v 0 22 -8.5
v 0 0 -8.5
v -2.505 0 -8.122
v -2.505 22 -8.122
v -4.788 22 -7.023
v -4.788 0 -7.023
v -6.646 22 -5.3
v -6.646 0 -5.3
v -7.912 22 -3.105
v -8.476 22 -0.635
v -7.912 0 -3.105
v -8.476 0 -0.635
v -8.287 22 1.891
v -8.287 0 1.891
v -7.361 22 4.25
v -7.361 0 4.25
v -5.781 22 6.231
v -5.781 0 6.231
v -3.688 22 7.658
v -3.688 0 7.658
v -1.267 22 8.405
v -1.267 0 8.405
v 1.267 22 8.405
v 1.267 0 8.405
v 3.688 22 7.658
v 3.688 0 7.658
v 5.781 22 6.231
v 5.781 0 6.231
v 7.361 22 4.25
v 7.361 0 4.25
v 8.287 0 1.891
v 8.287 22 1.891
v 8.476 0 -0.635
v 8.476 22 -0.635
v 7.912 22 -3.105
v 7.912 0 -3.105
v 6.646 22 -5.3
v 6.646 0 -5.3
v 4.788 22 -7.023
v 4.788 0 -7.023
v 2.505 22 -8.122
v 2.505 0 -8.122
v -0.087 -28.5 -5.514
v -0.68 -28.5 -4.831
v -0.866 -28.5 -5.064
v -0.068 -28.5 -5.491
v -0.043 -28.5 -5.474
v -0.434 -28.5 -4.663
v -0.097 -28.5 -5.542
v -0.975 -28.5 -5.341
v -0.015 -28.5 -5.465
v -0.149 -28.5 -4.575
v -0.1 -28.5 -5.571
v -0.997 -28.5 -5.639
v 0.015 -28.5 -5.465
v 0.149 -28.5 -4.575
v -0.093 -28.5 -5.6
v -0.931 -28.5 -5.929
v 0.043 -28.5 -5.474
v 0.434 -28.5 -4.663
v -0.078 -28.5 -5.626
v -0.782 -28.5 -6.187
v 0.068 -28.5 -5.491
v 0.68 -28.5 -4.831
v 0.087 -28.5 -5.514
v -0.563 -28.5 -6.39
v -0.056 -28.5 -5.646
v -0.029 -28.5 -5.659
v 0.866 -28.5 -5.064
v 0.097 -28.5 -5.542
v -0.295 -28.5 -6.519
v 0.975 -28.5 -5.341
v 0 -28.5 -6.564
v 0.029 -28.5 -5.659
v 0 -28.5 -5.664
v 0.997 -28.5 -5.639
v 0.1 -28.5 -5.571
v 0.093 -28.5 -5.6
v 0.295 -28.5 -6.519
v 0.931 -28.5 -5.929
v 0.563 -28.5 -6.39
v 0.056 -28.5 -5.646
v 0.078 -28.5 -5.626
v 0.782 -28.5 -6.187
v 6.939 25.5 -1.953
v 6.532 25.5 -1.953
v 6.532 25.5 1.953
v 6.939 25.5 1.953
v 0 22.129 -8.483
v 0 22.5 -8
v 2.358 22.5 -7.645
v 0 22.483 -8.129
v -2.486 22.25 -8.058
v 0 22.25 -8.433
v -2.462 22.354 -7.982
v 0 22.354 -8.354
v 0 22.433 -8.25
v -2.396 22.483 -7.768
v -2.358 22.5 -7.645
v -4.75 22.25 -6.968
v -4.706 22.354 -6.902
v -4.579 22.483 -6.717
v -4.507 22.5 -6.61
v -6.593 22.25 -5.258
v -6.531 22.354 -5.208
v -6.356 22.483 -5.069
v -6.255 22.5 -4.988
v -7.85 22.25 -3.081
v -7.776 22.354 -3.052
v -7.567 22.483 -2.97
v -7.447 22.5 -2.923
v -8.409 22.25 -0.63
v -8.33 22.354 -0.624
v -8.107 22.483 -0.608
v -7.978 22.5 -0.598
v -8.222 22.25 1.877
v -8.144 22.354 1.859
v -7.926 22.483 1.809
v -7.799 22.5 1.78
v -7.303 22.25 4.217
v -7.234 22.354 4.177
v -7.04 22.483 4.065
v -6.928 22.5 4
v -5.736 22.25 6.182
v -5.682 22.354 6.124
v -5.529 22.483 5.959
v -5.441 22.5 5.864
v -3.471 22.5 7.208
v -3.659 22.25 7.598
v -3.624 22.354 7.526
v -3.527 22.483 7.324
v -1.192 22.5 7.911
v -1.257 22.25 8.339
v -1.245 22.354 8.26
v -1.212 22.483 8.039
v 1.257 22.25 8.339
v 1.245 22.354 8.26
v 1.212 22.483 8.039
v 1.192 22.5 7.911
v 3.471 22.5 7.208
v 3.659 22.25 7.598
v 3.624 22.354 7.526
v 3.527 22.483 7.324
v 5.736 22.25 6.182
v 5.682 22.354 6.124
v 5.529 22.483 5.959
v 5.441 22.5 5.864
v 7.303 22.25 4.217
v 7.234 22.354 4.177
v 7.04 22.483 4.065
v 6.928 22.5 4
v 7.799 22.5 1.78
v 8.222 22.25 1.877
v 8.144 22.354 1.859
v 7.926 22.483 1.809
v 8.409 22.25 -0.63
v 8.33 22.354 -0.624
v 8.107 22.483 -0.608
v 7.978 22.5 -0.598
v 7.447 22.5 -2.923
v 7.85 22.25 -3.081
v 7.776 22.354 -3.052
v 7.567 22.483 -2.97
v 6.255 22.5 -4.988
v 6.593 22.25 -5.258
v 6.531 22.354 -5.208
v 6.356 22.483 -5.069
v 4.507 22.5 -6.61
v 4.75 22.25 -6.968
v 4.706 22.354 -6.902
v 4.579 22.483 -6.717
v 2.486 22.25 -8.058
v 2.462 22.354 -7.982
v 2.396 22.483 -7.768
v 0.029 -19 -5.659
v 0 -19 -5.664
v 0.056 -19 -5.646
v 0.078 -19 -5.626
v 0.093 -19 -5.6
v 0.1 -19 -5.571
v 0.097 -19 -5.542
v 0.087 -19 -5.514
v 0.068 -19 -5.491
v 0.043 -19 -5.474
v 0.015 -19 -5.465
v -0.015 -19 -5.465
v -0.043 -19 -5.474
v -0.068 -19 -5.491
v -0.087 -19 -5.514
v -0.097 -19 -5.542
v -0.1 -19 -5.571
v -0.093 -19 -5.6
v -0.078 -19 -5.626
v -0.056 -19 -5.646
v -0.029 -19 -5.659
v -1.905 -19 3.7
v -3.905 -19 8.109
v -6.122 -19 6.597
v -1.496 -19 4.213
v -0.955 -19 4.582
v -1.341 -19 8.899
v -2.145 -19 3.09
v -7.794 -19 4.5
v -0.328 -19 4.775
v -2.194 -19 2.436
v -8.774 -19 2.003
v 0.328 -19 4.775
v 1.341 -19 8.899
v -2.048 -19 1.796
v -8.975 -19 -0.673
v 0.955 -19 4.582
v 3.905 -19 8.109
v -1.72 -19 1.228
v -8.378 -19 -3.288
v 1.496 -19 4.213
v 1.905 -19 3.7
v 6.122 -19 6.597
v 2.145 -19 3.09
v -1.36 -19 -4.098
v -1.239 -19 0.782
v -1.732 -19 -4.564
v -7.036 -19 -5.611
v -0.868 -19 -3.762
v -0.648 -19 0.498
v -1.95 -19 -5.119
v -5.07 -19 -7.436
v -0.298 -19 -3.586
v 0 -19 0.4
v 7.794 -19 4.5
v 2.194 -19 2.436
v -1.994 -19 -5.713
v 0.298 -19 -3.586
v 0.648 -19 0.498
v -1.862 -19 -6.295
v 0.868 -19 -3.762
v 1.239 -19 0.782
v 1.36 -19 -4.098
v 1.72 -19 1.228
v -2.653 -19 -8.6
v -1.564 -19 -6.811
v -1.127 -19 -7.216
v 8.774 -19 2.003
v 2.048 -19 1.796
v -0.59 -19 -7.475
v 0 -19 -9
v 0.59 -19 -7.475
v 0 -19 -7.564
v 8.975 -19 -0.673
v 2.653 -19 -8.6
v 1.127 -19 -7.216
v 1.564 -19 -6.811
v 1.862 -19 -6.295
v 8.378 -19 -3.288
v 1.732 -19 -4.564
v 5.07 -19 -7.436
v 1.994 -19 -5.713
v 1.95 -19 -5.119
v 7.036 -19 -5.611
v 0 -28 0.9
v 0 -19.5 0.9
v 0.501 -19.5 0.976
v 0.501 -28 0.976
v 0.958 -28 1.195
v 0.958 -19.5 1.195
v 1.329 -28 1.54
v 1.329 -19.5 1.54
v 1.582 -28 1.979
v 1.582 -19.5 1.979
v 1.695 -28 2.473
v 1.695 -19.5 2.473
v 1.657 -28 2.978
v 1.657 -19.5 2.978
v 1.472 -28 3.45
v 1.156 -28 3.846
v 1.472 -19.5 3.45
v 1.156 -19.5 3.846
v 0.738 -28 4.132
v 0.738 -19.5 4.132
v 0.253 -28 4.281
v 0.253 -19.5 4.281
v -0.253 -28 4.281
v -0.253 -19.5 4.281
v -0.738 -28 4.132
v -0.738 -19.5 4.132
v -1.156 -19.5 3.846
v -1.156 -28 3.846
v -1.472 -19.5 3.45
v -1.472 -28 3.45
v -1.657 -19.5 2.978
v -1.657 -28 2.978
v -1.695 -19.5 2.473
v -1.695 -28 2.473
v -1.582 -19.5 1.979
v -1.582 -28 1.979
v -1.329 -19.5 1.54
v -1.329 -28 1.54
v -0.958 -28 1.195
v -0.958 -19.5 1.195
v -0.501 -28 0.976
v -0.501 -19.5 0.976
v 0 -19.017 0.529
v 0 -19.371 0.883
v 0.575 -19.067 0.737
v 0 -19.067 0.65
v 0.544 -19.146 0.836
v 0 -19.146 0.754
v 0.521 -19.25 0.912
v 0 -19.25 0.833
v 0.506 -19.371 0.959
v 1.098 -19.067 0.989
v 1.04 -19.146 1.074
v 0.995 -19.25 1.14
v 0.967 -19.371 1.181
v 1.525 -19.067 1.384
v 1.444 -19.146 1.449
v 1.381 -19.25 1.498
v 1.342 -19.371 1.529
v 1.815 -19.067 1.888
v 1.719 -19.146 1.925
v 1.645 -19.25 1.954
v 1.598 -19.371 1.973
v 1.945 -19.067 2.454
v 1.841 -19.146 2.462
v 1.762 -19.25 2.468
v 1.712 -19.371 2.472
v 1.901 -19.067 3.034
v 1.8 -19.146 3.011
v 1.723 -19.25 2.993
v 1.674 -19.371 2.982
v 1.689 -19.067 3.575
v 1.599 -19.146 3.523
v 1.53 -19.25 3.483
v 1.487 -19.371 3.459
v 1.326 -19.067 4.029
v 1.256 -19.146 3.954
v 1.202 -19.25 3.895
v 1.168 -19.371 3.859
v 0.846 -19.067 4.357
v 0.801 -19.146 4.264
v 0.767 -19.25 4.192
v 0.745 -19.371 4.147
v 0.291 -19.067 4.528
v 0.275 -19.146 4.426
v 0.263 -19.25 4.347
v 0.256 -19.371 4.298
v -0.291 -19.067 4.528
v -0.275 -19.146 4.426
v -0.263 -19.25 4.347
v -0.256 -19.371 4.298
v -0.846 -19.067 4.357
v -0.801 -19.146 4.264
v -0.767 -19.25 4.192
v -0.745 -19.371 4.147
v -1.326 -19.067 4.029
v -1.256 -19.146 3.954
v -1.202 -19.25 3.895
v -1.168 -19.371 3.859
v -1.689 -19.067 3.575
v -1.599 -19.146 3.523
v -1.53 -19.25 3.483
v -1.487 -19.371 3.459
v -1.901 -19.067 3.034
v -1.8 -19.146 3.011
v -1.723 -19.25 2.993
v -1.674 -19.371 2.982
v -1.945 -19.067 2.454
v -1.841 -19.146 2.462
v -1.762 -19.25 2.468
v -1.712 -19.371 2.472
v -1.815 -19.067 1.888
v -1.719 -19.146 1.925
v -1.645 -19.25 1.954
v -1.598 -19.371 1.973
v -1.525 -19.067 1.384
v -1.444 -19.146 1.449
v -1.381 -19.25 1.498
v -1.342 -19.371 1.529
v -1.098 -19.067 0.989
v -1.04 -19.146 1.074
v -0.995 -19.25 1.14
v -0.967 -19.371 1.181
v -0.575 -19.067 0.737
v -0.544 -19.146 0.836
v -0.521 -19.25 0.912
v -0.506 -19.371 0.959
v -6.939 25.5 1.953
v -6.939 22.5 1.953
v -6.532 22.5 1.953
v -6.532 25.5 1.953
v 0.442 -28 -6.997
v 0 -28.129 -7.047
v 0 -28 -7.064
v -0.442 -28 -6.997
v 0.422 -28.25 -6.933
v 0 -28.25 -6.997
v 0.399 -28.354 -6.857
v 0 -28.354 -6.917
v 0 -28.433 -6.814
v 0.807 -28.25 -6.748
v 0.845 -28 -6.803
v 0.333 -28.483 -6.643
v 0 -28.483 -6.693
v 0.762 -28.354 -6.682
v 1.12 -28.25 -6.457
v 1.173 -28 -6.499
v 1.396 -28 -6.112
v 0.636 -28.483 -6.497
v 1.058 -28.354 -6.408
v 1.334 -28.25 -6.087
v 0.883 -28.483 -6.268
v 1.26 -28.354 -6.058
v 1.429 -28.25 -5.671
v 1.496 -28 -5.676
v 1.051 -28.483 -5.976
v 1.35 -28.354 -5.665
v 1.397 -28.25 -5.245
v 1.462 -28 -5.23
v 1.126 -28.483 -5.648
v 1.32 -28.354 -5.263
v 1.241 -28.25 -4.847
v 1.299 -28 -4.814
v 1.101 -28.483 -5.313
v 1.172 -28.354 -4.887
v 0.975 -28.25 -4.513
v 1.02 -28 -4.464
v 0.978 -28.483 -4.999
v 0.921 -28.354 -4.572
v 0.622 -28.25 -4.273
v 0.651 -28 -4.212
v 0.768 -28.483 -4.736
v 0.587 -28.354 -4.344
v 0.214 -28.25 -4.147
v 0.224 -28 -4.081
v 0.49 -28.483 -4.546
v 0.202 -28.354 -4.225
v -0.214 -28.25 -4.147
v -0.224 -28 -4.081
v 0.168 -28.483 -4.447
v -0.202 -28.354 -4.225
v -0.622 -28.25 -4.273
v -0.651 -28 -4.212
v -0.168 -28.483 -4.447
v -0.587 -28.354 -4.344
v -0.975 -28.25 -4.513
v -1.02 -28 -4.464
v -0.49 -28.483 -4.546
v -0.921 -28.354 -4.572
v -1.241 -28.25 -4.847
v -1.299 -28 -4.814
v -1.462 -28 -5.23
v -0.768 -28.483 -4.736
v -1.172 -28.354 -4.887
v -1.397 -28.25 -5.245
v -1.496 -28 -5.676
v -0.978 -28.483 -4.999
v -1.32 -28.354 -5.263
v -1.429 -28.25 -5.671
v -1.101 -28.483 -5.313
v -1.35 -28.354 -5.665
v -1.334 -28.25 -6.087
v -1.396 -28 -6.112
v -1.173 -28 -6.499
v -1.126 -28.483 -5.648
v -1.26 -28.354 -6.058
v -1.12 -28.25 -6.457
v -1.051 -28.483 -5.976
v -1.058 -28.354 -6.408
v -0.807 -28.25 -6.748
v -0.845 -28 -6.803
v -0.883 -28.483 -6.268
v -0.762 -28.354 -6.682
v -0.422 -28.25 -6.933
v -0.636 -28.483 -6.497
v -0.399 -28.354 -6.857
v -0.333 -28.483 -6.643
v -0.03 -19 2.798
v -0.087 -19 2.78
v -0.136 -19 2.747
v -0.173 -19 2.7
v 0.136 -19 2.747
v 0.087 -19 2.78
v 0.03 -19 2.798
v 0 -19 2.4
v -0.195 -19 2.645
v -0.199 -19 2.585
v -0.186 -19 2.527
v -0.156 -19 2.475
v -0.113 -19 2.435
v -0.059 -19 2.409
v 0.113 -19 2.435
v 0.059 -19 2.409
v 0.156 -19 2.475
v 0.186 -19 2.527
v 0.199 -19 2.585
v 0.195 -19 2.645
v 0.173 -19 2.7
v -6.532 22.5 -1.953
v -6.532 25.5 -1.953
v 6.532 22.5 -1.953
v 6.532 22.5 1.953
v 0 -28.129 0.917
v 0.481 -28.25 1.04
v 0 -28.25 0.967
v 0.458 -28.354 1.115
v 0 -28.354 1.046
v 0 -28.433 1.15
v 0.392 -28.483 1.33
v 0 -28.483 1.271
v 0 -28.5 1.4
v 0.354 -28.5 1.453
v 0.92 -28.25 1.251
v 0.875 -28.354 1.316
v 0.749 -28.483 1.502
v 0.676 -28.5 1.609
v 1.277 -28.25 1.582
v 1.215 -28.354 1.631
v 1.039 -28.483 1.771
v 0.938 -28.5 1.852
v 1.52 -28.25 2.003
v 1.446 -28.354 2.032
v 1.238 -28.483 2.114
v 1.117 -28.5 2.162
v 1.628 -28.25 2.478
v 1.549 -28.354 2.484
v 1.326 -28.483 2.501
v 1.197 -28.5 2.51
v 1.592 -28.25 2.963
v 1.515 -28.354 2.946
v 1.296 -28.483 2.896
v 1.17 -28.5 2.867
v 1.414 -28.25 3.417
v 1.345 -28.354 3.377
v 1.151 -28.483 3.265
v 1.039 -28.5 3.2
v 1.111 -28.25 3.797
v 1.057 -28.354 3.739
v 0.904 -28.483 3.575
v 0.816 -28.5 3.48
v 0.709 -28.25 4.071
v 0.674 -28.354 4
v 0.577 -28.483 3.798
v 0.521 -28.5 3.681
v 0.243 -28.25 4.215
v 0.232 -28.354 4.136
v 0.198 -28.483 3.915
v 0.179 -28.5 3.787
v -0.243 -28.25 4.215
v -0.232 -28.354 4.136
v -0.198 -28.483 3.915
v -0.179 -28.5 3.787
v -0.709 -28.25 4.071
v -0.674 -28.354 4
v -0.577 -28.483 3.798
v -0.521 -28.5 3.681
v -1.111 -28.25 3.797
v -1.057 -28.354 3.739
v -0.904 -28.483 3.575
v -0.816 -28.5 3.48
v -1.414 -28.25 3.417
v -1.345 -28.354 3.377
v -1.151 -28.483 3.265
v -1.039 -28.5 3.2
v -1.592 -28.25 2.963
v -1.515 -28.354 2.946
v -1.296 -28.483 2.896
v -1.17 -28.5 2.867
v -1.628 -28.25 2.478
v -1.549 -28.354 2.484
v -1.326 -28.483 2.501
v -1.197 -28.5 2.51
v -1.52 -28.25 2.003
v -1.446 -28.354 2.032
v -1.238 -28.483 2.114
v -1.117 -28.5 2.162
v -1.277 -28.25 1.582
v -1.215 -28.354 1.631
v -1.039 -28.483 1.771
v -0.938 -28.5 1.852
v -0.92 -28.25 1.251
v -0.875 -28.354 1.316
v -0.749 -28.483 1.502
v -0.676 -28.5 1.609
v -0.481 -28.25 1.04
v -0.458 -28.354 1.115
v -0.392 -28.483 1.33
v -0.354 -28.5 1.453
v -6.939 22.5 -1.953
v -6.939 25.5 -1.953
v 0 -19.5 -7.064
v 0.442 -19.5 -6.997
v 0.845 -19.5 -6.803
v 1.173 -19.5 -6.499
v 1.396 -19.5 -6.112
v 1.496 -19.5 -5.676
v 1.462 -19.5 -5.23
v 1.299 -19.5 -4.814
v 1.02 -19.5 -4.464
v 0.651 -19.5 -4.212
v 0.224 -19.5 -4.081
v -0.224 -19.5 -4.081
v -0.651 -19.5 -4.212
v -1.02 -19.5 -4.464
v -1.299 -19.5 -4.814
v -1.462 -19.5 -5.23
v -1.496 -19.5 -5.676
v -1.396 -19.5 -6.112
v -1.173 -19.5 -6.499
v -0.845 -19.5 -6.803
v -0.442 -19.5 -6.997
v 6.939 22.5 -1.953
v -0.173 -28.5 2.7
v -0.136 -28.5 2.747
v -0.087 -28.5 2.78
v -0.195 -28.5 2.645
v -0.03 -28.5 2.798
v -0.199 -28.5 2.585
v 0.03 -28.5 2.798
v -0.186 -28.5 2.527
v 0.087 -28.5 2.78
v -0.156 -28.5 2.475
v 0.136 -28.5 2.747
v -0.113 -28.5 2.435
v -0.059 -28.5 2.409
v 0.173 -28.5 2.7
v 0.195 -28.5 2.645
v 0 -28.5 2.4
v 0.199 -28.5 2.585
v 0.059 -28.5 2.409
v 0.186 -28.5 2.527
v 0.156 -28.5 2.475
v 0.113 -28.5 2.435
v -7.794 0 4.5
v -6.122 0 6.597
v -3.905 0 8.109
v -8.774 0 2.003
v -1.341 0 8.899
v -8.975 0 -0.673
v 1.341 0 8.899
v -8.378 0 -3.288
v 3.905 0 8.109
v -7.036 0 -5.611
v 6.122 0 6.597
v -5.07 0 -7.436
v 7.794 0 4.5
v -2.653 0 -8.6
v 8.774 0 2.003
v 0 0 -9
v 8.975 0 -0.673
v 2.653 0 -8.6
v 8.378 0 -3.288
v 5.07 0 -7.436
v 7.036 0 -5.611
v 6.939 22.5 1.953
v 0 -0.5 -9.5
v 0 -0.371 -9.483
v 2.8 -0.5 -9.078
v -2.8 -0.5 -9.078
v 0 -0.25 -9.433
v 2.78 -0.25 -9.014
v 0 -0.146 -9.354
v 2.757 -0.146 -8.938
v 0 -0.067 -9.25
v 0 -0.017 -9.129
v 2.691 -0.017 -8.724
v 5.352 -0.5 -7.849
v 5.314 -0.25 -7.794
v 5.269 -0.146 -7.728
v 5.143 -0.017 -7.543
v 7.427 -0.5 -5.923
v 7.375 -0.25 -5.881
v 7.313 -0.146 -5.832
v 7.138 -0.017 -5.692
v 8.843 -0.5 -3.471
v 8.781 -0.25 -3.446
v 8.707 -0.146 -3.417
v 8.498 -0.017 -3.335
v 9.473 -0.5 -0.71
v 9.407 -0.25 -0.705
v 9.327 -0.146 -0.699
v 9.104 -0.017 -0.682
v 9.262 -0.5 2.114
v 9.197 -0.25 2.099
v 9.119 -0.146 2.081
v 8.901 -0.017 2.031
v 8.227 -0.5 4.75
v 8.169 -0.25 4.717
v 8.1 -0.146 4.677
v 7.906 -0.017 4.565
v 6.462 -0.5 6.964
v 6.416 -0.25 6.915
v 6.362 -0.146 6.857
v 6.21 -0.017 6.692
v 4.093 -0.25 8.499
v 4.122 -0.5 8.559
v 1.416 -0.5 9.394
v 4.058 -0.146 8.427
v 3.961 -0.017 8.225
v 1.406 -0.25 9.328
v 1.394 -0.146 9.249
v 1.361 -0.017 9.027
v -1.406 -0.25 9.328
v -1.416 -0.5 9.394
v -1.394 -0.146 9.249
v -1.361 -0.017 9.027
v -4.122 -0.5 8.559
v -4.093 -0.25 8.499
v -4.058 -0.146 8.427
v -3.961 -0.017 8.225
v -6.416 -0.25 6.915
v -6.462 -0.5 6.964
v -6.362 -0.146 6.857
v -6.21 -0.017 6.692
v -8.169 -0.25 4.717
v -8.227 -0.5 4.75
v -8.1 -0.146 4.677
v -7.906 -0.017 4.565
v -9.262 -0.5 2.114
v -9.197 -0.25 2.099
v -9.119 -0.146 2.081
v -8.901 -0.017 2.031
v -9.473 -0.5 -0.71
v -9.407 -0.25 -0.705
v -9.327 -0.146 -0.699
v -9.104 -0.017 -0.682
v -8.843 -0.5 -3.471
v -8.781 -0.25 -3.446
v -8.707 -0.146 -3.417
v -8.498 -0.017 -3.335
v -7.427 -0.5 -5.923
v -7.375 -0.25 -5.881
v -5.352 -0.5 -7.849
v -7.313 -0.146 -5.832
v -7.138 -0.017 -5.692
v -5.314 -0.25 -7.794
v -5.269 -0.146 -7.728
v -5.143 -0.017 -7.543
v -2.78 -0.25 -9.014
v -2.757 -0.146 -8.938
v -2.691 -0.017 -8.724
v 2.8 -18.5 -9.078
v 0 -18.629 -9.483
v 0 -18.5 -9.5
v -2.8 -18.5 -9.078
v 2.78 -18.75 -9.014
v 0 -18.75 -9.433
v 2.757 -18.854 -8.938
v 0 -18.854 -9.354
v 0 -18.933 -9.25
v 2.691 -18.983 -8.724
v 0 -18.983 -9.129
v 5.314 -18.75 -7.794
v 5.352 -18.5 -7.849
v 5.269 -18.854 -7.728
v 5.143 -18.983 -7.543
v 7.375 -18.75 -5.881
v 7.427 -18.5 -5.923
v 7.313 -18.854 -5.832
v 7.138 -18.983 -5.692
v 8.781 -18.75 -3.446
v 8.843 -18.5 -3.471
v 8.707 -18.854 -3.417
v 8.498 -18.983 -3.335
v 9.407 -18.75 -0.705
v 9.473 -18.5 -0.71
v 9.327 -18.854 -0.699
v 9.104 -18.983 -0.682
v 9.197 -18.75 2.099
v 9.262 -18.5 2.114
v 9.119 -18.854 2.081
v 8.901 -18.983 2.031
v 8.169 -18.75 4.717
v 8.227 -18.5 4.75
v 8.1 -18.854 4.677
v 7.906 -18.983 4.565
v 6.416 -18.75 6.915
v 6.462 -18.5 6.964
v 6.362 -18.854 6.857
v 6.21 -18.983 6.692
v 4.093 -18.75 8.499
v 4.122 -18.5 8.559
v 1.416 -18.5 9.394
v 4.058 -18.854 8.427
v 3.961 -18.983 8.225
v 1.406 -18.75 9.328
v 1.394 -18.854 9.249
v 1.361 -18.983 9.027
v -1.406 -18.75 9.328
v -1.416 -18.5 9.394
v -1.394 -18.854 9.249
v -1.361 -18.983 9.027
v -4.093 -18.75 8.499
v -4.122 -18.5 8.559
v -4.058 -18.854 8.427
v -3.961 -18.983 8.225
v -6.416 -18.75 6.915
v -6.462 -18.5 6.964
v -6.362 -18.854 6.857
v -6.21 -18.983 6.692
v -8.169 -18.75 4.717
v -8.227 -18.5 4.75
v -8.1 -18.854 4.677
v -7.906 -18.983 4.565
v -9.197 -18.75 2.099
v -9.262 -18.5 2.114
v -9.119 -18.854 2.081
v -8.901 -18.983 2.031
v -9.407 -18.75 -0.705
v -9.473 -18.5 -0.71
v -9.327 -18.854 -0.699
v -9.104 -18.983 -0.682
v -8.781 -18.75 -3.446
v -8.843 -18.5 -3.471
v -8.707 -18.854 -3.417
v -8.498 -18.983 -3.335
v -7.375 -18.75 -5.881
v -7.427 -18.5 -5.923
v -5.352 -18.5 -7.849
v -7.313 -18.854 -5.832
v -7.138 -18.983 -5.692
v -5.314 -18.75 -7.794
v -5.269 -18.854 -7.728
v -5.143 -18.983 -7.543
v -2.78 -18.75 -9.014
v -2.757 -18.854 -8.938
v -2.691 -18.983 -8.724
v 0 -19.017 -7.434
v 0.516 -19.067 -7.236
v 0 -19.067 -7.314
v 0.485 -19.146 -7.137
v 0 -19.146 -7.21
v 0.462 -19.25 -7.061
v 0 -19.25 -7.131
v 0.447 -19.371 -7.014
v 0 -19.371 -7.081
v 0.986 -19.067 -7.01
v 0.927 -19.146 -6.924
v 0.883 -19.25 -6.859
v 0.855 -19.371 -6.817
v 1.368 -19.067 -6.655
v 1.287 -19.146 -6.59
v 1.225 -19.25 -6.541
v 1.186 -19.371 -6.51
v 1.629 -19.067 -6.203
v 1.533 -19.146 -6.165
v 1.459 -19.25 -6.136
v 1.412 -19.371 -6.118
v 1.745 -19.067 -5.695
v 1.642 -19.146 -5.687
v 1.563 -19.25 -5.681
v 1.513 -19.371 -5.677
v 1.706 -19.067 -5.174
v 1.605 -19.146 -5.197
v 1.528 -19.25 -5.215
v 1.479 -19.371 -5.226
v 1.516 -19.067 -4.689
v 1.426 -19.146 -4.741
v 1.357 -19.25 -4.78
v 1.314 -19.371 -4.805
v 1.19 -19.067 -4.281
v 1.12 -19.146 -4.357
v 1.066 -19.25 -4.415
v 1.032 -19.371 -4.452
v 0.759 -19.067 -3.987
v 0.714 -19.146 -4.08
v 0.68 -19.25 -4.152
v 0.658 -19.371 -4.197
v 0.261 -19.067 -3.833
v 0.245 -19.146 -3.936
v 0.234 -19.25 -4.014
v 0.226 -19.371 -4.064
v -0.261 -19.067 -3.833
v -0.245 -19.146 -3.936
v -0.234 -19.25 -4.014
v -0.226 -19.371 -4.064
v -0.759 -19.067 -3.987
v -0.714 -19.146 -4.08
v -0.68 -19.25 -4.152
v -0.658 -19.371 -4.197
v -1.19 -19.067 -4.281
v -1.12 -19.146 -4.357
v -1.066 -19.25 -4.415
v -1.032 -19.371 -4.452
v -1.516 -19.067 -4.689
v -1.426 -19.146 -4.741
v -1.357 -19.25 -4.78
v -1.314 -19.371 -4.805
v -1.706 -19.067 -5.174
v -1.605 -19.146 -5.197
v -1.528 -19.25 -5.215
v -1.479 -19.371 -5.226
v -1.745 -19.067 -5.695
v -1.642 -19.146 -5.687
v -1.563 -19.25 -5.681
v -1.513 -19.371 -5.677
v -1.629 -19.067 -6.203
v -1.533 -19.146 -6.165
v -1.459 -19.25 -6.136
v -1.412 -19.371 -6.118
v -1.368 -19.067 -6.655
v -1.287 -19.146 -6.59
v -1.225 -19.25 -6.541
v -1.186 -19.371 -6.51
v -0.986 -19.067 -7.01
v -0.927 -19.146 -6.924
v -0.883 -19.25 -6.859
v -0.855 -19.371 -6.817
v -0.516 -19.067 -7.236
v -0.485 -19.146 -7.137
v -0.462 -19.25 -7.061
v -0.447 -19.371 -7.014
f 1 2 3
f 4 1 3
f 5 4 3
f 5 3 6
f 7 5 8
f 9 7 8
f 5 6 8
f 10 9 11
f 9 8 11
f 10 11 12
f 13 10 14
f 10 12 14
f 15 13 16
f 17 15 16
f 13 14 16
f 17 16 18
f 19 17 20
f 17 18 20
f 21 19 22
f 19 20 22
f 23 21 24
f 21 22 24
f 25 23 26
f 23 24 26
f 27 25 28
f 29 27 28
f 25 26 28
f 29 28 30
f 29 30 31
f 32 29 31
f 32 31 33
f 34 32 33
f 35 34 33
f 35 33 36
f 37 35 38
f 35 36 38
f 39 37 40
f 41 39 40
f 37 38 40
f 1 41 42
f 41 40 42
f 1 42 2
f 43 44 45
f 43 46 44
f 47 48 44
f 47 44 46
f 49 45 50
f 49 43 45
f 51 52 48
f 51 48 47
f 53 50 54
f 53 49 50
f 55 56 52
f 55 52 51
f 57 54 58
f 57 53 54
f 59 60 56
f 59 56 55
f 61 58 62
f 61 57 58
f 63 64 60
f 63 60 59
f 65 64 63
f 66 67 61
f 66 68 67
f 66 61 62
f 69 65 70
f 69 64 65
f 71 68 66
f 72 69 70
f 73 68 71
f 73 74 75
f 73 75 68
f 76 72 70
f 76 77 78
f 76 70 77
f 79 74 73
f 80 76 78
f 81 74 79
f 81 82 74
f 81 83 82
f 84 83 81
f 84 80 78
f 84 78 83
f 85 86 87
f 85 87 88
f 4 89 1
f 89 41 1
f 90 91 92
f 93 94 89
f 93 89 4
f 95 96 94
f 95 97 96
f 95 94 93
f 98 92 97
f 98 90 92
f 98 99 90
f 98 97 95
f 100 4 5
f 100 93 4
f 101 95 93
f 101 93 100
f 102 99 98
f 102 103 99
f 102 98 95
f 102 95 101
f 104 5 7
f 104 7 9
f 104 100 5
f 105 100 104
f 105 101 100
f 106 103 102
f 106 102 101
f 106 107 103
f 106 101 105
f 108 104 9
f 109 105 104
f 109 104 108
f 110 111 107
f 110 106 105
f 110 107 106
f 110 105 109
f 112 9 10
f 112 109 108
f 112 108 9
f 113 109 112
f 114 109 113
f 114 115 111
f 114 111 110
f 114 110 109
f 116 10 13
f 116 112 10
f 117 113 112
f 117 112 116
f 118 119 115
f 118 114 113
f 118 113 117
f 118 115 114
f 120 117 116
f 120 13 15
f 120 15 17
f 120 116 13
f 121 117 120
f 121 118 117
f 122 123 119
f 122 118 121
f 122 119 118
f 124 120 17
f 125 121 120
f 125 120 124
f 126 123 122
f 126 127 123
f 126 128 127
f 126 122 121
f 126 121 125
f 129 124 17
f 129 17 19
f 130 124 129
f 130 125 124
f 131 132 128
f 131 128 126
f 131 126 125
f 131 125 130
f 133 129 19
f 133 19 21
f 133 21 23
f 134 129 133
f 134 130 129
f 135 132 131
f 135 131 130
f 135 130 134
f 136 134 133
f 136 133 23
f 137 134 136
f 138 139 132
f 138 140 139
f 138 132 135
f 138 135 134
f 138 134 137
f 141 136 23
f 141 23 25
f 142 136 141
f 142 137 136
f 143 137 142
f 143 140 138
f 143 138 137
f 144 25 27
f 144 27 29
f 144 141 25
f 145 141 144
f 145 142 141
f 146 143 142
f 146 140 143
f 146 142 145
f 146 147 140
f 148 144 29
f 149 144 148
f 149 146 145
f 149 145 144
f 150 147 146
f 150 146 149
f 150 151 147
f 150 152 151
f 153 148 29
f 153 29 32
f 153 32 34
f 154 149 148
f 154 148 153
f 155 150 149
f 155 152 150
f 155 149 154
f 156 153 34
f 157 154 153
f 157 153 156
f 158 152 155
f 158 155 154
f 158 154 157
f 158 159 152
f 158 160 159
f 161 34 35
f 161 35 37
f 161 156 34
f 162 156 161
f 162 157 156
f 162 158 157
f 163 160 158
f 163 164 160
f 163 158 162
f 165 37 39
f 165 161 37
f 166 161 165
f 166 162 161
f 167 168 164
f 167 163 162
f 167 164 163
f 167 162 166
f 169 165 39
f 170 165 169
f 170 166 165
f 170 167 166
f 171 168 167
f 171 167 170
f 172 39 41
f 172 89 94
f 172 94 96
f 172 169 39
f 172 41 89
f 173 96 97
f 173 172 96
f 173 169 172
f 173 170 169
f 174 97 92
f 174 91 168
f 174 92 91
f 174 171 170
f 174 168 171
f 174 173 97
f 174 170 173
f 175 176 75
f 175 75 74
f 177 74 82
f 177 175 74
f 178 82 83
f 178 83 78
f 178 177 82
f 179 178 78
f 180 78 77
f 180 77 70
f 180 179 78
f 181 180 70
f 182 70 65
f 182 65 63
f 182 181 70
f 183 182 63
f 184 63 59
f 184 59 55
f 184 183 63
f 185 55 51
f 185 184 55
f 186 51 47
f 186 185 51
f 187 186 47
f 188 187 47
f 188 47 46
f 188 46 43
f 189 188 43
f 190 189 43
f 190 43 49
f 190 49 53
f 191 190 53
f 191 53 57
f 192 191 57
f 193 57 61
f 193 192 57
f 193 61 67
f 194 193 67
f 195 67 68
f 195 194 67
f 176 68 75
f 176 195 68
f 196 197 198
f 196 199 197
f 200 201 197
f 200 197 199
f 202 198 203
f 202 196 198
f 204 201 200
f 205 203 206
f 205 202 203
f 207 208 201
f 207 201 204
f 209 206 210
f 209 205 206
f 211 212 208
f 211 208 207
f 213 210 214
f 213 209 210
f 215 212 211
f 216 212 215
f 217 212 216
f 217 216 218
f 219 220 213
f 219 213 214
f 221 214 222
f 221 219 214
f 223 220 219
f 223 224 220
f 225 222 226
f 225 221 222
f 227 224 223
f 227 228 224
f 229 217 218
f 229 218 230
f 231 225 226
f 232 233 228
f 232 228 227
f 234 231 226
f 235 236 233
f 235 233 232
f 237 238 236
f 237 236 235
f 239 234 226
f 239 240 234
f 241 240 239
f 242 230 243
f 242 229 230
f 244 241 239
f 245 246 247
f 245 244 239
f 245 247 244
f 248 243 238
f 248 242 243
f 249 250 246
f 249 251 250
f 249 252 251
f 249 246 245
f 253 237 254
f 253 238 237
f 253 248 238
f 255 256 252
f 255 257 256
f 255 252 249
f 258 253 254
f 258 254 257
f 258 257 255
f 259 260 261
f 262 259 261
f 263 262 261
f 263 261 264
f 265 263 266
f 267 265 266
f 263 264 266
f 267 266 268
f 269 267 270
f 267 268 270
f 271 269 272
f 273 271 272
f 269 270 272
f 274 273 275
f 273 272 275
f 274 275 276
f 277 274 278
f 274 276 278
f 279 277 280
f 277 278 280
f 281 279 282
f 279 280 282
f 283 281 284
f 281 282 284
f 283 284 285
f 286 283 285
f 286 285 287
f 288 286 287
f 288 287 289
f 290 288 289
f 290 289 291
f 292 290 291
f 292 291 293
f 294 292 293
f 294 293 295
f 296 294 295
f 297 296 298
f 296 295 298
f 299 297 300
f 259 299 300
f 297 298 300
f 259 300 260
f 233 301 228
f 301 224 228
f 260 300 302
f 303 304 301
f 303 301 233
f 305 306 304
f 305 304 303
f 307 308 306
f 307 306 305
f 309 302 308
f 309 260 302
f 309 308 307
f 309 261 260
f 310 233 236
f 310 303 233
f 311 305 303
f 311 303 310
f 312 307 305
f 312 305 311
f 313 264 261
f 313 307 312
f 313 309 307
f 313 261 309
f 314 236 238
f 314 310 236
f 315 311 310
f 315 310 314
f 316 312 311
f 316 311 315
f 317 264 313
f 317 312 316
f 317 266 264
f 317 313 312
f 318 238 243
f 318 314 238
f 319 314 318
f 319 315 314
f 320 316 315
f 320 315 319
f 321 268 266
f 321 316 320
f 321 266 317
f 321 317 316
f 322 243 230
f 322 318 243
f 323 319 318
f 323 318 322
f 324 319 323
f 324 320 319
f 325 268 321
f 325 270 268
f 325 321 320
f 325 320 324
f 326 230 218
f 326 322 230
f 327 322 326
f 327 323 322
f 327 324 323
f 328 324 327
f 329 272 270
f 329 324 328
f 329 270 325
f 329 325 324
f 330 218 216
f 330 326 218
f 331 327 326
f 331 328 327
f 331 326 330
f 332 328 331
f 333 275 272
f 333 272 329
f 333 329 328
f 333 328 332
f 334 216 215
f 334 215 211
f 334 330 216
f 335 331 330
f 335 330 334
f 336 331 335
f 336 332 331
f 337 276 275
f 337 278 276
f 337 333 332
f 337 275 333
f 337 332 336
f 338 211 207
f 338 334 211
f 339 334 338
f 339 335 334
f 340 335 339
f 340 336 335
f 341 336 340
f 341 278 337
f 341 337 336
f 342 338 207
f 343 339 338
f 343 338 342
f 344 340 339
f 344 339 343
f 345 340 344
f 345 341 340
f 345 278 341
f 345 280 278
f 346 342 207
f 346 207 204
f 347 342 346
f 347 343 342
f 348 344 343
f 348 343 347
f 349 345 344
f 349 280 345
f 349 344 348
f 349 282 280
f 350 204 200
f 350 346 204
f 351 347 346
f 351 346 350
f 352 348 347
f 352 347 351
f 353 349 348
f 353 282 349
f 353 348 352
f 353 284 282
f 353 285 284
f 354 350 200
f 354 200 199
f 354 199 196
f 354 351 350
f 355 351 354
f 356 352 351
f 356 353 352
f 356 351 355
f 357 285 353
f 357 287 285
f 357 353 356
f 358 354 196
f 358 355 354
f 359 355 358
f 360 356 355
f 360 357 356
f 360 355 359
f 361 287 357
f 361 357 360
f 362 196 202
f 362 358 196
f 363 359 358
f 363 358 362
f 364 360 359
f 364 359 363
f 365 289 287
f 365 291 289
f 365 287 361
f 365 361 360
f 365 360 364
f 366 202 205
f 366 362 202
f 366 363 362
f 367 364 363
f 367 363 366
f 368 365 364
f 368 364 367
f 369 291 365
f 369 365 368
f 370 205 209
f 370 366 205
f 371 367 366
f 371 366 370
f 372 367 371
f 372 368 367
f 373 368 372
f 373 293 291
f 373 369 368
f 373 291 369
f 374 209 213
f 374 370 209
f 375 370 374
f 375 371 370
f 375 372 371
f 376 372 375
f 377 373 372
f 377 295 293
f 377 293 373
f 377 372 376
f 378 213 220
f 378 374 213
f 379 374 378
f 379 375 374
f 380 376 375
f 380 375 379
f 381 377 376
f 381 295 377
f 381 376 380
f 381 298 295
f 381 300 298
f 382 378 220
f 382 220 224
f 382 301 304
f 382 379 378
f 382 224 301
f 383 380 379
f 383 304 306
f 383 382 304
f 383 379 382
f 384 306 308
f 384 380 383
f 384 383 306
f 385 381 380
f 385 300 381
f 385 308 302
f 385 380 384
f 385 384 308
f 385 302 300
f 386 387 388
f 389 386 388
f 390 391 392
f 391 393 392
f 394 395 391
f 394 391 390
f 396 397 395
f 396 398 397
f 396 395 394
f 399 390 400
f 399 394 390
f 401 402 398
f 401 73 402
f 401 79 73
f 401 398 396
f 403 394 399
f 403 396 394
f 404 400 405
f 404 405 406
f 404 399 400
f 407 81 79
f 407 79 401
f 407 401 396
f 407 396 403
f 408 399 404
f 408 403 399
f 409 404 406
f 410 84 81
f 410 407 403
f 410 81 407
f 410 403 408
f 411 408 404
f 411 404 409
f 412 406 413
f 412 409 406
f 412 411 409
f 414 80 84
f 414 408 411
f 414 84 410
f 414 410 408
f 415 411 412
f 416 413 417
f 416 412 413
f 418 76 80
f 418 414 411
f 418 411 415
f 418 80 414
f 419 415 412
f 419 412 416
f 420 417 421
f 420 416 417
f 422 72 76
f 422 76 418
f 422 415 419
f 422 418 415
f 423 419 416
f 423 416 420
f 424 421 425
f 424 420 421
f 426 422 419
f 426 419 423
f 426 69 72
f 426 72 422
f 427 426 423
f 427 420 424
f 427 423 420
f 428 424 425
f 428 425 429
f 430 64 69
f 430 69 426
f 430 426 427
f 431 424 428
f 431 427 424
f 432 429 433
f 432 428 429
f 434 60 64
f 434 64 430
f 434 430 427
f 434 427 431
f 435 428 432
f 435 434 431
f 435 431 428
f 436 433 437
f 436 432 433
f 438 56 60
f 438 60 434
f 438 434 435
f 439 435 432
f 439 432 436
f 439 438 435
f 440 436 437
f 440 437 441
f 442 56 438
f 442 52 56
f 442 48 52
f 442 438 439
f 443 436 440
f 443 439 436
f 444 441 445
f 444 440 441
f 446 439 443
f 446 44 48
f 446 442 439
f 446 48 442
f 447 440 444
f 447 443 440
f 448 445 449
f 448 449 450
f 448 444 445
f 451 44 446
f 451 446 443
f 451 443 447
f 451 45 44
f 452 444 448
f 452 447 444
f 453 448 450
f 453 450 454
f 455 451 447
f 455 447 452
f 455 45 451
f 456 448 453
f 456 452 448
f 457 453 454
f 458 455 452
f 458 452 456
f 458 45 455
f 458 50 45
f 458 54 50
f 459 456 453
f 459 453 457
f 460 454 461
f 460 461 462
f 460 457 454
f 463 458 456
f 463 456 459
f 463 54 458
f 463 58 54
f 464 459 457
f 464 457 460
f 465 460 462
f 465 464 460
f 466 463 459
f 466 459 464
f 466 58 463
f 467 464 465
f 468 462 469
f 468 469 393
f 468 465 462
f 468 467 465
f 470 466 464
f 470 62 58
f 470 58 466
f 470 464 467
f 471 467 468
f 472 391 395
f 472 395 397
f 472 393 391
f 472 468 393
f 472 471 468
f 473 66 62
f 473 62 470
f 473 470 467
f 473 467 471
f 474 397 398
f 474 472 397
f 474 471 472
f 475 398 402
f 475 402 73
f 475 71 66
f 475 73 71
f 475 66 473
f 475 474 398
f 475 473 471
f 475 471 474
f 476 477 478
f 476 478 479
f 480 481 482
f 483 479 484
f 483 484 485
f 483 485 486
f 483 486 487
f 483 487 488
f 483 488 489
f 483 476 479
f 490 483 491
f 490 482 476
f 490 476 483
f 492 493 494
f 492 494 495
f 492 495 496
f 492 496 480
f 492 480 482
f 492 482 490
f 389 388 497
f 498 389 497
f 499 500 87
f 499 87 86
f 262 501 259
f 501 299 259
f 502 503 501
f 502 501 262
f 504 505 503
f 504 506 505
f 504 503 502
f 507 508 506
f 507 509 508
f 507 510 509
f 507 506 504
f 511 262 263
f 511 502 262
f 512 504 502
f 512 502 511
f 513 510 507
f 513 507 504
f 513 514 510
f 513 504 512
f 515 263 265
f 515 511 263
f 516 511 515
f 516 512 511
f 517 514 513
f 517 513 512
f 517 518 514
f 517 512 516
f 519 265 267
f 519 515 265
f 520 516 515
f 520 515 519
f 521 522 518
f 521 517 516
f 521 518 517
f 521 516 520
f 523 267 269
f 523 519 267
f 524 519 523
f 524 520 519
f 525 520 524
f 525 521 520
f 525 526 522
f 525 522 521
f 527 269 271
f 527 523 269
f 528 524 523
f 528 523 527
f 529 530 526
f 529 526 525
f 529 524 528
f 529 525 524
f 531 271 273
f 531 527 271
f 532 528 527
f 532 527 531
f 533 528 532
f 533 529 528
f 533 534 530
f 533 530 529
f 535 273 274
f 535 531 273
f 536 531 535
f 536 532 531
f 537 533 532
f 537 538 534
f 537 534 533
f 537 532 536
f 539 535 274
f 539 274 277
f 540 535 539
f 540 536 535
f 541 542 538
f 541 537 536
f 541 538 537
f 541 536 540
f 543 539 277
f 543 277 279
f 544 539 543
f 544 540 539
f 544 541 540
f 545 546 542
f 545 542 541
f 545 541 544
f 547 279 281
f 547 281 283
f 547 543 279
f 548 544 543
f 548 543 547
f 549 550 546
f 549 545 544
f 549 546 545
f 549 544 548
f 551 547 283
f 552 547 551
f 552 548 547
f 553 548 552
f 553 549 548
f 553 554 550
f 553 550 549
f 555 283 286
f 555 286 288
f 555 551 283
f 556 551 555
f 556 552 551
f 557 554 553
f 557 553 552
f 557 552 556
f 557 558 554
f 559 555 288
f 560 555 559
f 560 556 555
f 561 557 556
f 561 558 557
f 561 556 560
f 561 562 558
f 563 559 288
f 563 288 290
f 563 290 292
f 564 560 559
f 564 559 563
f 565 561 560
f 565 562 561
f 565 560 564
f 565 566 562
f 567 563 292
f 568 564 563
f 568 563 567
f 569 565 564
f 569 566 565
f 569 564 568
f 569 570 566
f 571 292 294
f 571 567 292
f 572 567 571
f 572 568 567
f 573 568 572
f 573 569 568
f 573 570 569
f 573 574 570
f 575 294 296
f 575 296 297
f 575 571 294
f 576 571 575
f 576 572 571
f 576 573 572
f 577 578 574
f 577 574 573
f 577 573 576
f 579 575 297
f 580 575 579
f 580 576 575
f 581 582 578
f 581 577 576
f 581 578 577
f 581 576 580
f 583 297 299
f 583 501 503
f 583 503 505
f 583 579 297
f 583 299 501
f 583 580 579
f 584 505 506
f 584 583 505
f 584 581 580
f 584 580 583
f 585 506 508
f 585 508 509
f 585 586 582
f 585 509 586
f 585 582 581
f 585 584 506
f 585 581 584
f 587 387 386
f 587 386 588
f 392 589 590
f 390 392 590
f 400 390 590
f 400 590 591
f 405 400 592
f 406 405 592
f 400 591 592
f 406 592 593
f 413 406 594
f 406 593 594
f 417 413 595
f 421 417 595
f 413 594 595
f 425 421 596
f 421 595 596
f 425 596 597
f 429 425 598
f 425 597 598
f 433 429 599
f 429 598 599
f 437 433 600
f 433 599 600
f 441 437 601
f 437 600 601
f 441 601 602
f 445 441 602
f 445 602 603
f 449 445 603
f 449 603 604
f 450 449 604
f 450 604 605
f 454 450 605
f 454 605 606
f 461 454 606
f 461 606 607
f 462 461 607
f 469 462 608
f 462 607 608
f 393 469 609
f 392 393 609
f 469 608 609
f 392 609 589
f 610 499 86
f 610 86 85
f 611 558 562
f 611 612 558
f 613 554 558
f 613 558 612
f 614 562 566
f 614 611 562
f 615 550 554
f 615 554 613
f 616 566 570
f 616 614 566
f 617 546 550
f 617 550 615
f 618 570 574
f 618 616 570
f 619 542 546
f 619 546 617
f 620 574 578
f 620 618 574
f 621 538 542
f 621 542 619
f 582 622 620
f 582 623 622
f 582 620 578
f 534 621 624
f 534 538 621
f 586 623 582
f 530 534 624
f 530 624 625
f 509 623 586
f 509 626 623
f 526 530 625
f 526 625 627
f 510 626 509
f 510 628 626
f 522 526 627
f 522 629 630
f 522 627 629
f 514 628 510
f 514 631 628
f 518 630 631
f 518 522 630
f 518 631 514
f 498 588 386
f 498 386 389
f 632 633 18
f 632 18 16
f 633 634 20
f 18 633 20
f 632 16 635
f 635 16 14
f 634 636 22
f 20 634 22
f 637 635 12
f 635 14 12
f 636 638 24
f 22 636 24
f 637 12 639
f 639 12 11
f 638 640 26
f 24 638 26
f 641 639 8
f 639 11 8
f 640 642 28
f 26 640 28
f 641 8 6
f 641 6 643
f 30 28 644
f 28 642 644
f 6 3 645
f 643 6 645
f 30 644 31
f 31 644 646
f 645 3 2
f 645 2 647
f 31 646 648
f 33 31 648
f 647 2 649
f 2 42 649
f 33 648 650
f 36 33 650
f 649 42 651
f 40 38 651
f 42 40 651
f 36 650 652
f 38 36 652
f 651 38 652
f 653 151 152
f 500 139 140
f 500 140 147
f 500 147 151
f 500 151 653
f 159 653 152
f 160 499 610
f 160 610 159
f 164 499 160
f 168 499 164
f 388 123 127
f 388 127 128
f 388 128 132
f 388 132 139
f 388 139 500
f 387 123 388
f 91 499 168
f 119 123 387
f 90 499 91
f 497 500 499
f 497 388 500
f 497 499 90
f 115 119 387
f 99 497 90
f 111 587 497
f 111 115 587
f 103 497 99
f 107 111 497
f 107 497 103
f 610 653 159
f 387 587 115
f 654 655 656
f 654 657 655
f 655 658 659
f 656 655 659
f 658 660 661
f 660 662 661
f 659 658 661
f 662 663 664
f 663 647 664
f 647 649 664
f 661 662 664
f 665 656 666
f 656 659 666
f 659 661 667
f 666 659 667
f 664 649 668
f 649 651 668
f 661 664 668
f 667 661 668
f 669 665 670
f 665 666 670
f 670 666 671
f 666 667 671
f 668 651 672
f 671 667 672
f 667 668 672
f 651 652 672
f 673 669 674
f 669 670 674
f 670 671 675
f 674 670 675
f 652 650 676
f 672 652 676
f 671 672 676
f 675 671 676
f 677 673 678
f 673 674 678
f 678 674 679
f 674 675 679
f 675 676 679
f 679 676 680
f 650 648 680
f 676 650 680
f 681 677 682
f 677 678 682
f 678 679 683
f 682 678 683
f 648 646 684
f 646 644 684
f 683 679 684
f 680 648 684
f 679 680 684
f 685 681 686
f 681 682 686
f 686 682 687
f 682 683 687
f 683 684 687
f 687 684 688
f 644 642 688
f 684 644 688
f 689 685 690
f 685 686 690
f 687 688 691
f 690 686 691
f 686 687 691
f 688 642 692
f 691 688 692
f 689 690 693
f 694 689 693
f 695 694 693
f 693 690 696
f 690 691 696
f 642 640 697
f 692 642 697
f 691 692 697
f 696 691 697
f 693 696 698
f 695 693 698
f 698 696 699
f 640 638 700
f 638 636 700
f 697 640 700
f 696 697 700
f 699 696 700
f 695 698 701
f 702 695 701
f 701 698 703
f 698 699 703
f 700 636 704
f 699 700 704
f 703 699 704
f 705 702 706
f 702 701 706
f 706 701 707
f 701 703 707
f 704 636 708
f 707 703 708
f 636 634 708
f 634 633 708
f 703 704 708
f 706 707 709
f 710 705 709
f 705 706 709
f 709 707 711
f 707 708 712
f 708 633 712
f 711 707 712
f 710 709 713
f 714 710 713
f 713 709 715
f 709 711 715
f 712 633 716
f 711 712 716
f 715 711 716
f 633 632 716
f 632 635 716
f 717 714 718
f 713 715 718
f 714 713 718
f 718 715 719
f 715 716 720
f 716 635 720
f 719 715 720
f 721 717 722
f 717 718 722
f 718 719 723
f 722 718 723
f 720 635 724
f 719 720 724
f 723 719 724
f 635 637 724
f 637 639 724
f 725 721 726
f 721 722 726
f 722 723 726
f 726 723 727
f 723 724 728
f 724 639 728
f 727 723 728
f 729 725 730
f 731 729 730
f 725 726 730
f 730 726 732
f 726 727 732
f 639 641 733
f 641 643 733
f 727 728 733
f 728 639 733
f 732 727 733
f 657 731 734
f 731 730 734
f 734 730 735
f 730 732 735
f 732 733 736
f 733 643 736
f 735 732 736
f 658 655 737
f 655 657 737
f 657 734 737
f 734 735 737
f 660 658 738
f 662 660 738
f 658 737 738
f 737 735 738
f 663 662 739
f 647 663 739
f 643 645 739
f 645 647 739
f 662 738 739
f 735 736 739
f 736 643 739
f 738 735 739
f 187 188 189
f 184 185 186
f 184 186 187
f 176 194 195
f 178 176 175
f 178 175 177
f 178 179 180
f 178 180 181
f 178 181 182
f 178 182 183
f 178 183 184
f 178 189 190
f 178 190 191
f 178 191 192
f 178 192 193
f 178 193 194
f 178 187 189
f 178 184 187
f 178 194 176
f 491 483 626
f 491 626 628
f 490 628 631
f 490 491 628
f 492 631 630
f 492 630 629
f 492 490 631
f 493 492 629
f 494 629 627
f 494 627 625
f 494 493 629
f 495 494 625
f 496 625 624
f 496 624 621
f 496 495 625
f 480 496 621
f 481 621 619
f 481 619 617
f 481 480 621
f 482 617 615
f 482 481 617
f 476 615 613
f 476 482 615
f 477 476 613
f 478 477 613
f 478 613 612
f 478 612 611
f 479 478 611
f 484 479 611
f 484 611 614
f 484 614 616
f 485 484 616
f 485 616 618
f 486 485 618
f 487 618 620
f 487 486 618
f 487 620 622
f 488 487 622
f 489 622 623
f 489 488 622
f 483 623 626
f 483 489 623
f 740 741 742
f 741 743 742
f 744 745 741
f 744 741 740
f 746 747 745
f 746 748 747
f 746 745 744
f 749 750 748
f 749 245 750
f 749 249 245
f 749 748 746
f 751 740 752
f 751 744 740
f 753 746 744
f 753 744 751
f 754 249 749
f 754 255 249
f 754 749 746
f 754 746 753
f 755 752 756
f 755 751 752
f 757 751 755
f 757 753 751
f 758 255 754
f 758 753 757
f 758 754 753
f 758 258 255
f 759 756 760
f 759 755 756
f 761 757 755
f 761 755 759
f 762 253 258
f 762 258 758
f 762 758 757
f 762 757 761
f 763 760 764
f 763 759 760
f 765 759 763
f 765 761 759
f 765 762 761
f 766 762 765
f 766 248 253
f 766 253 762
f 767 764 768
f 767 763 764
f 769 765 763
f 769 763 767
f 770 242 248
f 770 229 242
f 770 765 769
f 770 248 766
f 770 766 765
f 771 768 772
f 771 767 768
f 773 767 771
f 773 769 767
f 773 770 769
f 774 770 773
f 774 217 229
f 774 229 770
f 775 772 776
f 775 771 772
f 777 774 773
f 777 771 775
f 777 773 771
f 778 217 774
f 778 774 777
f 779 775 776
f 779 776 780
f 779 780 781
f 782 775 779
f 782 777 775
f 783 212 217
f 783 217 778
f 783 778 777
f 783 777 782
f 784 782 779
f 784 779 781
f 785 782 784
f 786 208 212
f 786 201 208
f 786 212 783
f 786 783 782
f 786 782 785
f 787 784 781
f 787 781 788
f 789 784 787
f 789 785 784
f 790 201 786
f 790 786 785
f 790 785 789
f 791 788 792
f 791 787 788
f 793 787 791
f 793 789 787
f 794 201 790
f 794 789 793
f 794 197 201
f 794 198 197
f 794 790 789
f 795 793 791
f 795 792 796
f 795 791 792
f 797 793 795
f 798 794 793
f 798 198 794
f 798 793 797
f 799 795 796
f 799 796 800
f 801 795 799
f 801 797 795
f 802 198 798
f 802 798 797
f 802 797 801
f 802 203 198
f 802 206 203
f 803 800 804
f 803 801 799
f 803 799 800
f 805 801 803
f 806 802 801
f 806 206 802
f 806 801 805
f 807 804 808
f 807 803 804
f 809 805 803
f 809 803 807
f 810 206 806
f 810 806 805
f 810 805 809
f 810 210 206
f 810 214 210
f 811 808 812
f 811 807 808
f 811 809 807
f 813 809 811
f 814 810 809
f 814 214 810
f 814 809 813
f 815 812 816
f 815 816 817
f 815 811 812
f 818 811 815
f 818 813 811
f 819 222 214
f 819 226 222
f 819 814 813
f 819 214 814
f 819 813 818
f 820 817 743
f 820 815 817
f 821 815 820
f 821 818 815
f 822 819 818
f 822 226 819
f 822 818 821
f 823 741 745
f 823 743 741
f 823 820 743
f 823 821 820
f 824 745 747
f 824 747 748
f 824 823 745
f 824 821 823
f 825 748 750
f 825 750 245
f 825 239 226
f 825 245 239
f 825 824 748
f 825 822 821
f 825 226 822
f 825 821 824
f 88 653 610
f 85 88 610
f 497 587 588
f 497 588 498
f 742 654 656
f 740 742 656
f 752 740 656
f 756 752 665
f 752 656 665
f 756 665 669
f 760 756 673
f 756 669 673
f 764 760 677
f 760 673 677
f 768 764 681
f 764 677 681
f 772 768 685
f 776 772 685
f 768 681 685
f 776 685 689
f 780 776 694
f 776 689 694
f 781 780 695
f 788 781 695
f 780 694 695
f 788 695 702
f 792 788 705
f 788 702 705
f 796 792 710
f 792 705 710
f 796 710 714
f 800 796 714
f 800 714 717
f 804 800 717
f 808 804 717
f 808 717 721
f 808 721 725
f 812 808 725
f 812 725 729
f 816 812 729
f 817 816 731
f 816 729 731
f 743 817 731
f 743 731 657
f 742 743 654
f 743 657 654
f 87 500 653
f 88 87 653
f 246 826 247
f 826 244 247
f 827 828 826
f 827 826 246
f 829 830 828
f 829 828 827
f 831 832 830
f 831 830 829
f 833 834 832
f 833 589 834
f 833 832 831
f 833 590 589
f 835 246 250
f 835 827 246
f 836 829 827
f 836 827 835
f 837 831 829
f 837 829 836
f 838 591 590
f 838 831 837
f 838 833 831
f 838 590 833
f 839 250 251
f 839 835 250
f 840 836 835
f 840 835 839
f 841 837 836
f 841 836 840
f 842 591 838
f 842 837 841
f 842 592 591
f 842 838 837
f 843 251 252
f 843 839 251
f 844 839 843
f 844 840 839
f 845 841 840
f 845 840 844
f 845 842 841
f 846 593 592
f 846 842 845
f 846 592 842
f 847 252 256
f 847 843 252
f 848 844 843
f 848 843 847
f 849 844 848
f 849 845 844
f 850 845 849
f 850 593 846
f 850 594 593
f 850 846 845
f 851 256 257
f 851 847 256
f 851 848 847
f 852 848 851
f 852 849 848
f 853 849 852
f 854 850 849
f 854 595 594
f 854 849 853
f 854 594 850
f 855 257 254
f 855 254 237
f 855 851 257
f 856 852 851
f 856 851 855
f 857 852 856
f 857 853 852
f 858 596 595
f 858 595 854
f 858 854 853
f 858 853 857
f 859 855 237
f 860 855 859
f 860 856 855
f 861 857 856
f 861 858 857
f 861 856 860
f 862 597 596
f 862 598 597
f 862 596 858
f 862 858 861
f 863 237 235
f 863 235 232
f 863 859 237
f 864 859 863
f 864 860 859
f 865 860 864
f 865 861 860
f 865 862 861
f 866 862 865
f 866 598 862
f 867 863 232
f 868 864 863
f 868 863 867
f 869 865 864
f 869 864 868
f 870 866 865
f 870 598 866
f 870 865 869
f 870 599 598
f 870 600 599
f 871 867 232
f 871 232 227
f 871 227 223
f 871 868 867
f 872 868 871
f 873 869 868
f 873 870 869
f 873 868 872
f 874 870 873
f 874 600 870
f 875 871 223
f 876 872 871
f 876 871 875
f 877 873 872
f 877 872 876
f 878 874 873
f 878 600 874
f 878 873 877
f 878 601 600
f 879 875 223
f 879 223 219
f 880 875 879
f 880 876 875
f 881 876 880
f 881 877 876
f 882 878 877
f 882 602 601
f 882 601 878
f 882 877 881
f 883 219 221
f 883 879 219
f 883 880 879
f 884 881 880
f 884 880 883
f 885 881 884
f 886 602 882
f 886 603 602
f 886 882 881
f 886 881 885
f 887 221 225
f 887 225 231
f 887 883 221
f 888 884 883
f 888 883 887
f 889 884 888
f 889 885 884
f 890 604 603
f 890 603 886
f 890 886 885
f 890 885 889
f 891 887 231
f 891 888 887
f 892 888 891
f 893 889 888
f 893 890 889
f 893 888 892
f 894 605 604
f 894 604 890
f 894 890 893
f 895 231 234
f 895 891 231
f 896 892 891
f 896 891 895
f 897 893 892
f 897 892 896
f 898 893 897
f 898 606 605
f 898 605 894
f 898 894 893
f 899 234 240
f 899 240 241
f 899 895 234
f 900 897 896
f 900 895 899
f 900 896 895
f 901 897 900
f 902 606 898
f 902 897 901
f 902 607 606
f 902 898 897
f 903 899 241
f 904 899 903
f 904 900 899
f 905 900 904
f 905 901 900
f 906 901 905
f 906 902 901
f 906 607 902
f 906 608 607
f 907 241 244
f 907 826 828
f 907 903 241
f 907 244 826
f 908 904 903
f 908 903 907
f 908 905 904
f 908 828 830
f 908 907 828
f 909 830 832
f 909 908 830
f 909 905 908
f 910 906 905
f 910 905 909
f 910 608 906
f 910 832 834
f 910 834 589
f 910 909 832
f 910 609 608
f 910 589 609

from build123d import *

# Parameters (mm, degrees)
SKETCH_1_R      = 8.5
EXTRUDE_1_DEPTH = 22.5
SKETCH_2_R      = 9.5
EXTRUDE_2_DEPTH = 19
SKETCH_3_R      = 1.7
SKETCH_3_R_2    = 0.2
SKETCH_3_R_3    = 1.5
SKETCH_3_R_4    = 0.1
EXTRUDE_3_DEPTH = 9.5
SKETCH_4_W      = 0.406968973
SKETCH_4_H      = 3.906902144
EXTRUDE_4_DEPTH = 3
FILLET_2_R      = 0.5


with BuildPart() as part:
    # 草图1 → 凸台-拉伸1 (new body)
    with BuildSketch(Plane(origin=(0, 0, 0), x_dir=(1, 0, 0), z_dir=(0, 1, 0))):
        with Locations(Location((0, 0, 0), (0, 0, 90))):
            Circle(SKETCH_1_R)
    extrude(amount=EXTRUDE_1_DEPTH)

    # 草图2 → 凸台-拉伸2 (add)
    with BuildSketch(Plane.XZ):
        with Locations(Location((0, 0, 0), (0, 0, 270))):
            Circle(SKETCH_2_R)
    extrude(amount=EXTRUDE_2_DEPTH)

    # 草图3 → 凸台-拉伸3 (add)
    # profile 1 of 2: a face of its own
    with BuildSketch(Plane.XZ.offset(19)):
        with Locations(Location((0, 2.6, 0), (0, 0, 270))):
            Circle(SKETCH_3_R)
        with Locations(Location((0, 2.6, 0), (0, 0, 270))):
            Circle(SKETCH_3_R_2, mode=Mode.SUBTRACT)
    # profile 2 of 2: a face of its own
    with BuildSketch(Plane.XZ.offset(19)):
        with Locations(Location((0, -5.563865297, 0), (0, 0, 270))):
            Circle(SKETCH_3_R_3)
        with Locations(Location((0, -5.563865297, 0), (0, 0, 270))):
            Circle(SKETCH_3_R_4, mode=Mode.SUBTRACT)
    extrude(amount=EXTRUDE_3_DEPTH)

    # 草图4 → 凸台-拉伸4 (add)
    with BuildSketch(Plane(origin=(0, 22.5, 0), x_dir=(1, 0, 0), z_dir=(0, 1, 0))):
        with Locations((-6.735336509, 0)):
            Rectangle(SKETCH_4_W, SKETCH_4_H)
        with Locations((6.735336509, 0)):
            Rectangle(SKETCH_4_W, SKETCH_4_H)
    extrude(amount=EXTRUDE_4_DEPTH)

    # 圆角2
    fillet_2_edges = [part.edges().sort_by_distance(p)[0] for p in [
        (0, -19, 4.3),
        (0, -28.5, 4.3),
        (0, -28.5, -4.063865297),
        (0, -19, -4.063865297),
        (0, 22.5, 8.5),
        (0, 0, 9.5),
        (0, -19, 9.5),
    ]]
    fillet(fillet_2_edges, radius=FILLET_2_R)


solid = part.part
